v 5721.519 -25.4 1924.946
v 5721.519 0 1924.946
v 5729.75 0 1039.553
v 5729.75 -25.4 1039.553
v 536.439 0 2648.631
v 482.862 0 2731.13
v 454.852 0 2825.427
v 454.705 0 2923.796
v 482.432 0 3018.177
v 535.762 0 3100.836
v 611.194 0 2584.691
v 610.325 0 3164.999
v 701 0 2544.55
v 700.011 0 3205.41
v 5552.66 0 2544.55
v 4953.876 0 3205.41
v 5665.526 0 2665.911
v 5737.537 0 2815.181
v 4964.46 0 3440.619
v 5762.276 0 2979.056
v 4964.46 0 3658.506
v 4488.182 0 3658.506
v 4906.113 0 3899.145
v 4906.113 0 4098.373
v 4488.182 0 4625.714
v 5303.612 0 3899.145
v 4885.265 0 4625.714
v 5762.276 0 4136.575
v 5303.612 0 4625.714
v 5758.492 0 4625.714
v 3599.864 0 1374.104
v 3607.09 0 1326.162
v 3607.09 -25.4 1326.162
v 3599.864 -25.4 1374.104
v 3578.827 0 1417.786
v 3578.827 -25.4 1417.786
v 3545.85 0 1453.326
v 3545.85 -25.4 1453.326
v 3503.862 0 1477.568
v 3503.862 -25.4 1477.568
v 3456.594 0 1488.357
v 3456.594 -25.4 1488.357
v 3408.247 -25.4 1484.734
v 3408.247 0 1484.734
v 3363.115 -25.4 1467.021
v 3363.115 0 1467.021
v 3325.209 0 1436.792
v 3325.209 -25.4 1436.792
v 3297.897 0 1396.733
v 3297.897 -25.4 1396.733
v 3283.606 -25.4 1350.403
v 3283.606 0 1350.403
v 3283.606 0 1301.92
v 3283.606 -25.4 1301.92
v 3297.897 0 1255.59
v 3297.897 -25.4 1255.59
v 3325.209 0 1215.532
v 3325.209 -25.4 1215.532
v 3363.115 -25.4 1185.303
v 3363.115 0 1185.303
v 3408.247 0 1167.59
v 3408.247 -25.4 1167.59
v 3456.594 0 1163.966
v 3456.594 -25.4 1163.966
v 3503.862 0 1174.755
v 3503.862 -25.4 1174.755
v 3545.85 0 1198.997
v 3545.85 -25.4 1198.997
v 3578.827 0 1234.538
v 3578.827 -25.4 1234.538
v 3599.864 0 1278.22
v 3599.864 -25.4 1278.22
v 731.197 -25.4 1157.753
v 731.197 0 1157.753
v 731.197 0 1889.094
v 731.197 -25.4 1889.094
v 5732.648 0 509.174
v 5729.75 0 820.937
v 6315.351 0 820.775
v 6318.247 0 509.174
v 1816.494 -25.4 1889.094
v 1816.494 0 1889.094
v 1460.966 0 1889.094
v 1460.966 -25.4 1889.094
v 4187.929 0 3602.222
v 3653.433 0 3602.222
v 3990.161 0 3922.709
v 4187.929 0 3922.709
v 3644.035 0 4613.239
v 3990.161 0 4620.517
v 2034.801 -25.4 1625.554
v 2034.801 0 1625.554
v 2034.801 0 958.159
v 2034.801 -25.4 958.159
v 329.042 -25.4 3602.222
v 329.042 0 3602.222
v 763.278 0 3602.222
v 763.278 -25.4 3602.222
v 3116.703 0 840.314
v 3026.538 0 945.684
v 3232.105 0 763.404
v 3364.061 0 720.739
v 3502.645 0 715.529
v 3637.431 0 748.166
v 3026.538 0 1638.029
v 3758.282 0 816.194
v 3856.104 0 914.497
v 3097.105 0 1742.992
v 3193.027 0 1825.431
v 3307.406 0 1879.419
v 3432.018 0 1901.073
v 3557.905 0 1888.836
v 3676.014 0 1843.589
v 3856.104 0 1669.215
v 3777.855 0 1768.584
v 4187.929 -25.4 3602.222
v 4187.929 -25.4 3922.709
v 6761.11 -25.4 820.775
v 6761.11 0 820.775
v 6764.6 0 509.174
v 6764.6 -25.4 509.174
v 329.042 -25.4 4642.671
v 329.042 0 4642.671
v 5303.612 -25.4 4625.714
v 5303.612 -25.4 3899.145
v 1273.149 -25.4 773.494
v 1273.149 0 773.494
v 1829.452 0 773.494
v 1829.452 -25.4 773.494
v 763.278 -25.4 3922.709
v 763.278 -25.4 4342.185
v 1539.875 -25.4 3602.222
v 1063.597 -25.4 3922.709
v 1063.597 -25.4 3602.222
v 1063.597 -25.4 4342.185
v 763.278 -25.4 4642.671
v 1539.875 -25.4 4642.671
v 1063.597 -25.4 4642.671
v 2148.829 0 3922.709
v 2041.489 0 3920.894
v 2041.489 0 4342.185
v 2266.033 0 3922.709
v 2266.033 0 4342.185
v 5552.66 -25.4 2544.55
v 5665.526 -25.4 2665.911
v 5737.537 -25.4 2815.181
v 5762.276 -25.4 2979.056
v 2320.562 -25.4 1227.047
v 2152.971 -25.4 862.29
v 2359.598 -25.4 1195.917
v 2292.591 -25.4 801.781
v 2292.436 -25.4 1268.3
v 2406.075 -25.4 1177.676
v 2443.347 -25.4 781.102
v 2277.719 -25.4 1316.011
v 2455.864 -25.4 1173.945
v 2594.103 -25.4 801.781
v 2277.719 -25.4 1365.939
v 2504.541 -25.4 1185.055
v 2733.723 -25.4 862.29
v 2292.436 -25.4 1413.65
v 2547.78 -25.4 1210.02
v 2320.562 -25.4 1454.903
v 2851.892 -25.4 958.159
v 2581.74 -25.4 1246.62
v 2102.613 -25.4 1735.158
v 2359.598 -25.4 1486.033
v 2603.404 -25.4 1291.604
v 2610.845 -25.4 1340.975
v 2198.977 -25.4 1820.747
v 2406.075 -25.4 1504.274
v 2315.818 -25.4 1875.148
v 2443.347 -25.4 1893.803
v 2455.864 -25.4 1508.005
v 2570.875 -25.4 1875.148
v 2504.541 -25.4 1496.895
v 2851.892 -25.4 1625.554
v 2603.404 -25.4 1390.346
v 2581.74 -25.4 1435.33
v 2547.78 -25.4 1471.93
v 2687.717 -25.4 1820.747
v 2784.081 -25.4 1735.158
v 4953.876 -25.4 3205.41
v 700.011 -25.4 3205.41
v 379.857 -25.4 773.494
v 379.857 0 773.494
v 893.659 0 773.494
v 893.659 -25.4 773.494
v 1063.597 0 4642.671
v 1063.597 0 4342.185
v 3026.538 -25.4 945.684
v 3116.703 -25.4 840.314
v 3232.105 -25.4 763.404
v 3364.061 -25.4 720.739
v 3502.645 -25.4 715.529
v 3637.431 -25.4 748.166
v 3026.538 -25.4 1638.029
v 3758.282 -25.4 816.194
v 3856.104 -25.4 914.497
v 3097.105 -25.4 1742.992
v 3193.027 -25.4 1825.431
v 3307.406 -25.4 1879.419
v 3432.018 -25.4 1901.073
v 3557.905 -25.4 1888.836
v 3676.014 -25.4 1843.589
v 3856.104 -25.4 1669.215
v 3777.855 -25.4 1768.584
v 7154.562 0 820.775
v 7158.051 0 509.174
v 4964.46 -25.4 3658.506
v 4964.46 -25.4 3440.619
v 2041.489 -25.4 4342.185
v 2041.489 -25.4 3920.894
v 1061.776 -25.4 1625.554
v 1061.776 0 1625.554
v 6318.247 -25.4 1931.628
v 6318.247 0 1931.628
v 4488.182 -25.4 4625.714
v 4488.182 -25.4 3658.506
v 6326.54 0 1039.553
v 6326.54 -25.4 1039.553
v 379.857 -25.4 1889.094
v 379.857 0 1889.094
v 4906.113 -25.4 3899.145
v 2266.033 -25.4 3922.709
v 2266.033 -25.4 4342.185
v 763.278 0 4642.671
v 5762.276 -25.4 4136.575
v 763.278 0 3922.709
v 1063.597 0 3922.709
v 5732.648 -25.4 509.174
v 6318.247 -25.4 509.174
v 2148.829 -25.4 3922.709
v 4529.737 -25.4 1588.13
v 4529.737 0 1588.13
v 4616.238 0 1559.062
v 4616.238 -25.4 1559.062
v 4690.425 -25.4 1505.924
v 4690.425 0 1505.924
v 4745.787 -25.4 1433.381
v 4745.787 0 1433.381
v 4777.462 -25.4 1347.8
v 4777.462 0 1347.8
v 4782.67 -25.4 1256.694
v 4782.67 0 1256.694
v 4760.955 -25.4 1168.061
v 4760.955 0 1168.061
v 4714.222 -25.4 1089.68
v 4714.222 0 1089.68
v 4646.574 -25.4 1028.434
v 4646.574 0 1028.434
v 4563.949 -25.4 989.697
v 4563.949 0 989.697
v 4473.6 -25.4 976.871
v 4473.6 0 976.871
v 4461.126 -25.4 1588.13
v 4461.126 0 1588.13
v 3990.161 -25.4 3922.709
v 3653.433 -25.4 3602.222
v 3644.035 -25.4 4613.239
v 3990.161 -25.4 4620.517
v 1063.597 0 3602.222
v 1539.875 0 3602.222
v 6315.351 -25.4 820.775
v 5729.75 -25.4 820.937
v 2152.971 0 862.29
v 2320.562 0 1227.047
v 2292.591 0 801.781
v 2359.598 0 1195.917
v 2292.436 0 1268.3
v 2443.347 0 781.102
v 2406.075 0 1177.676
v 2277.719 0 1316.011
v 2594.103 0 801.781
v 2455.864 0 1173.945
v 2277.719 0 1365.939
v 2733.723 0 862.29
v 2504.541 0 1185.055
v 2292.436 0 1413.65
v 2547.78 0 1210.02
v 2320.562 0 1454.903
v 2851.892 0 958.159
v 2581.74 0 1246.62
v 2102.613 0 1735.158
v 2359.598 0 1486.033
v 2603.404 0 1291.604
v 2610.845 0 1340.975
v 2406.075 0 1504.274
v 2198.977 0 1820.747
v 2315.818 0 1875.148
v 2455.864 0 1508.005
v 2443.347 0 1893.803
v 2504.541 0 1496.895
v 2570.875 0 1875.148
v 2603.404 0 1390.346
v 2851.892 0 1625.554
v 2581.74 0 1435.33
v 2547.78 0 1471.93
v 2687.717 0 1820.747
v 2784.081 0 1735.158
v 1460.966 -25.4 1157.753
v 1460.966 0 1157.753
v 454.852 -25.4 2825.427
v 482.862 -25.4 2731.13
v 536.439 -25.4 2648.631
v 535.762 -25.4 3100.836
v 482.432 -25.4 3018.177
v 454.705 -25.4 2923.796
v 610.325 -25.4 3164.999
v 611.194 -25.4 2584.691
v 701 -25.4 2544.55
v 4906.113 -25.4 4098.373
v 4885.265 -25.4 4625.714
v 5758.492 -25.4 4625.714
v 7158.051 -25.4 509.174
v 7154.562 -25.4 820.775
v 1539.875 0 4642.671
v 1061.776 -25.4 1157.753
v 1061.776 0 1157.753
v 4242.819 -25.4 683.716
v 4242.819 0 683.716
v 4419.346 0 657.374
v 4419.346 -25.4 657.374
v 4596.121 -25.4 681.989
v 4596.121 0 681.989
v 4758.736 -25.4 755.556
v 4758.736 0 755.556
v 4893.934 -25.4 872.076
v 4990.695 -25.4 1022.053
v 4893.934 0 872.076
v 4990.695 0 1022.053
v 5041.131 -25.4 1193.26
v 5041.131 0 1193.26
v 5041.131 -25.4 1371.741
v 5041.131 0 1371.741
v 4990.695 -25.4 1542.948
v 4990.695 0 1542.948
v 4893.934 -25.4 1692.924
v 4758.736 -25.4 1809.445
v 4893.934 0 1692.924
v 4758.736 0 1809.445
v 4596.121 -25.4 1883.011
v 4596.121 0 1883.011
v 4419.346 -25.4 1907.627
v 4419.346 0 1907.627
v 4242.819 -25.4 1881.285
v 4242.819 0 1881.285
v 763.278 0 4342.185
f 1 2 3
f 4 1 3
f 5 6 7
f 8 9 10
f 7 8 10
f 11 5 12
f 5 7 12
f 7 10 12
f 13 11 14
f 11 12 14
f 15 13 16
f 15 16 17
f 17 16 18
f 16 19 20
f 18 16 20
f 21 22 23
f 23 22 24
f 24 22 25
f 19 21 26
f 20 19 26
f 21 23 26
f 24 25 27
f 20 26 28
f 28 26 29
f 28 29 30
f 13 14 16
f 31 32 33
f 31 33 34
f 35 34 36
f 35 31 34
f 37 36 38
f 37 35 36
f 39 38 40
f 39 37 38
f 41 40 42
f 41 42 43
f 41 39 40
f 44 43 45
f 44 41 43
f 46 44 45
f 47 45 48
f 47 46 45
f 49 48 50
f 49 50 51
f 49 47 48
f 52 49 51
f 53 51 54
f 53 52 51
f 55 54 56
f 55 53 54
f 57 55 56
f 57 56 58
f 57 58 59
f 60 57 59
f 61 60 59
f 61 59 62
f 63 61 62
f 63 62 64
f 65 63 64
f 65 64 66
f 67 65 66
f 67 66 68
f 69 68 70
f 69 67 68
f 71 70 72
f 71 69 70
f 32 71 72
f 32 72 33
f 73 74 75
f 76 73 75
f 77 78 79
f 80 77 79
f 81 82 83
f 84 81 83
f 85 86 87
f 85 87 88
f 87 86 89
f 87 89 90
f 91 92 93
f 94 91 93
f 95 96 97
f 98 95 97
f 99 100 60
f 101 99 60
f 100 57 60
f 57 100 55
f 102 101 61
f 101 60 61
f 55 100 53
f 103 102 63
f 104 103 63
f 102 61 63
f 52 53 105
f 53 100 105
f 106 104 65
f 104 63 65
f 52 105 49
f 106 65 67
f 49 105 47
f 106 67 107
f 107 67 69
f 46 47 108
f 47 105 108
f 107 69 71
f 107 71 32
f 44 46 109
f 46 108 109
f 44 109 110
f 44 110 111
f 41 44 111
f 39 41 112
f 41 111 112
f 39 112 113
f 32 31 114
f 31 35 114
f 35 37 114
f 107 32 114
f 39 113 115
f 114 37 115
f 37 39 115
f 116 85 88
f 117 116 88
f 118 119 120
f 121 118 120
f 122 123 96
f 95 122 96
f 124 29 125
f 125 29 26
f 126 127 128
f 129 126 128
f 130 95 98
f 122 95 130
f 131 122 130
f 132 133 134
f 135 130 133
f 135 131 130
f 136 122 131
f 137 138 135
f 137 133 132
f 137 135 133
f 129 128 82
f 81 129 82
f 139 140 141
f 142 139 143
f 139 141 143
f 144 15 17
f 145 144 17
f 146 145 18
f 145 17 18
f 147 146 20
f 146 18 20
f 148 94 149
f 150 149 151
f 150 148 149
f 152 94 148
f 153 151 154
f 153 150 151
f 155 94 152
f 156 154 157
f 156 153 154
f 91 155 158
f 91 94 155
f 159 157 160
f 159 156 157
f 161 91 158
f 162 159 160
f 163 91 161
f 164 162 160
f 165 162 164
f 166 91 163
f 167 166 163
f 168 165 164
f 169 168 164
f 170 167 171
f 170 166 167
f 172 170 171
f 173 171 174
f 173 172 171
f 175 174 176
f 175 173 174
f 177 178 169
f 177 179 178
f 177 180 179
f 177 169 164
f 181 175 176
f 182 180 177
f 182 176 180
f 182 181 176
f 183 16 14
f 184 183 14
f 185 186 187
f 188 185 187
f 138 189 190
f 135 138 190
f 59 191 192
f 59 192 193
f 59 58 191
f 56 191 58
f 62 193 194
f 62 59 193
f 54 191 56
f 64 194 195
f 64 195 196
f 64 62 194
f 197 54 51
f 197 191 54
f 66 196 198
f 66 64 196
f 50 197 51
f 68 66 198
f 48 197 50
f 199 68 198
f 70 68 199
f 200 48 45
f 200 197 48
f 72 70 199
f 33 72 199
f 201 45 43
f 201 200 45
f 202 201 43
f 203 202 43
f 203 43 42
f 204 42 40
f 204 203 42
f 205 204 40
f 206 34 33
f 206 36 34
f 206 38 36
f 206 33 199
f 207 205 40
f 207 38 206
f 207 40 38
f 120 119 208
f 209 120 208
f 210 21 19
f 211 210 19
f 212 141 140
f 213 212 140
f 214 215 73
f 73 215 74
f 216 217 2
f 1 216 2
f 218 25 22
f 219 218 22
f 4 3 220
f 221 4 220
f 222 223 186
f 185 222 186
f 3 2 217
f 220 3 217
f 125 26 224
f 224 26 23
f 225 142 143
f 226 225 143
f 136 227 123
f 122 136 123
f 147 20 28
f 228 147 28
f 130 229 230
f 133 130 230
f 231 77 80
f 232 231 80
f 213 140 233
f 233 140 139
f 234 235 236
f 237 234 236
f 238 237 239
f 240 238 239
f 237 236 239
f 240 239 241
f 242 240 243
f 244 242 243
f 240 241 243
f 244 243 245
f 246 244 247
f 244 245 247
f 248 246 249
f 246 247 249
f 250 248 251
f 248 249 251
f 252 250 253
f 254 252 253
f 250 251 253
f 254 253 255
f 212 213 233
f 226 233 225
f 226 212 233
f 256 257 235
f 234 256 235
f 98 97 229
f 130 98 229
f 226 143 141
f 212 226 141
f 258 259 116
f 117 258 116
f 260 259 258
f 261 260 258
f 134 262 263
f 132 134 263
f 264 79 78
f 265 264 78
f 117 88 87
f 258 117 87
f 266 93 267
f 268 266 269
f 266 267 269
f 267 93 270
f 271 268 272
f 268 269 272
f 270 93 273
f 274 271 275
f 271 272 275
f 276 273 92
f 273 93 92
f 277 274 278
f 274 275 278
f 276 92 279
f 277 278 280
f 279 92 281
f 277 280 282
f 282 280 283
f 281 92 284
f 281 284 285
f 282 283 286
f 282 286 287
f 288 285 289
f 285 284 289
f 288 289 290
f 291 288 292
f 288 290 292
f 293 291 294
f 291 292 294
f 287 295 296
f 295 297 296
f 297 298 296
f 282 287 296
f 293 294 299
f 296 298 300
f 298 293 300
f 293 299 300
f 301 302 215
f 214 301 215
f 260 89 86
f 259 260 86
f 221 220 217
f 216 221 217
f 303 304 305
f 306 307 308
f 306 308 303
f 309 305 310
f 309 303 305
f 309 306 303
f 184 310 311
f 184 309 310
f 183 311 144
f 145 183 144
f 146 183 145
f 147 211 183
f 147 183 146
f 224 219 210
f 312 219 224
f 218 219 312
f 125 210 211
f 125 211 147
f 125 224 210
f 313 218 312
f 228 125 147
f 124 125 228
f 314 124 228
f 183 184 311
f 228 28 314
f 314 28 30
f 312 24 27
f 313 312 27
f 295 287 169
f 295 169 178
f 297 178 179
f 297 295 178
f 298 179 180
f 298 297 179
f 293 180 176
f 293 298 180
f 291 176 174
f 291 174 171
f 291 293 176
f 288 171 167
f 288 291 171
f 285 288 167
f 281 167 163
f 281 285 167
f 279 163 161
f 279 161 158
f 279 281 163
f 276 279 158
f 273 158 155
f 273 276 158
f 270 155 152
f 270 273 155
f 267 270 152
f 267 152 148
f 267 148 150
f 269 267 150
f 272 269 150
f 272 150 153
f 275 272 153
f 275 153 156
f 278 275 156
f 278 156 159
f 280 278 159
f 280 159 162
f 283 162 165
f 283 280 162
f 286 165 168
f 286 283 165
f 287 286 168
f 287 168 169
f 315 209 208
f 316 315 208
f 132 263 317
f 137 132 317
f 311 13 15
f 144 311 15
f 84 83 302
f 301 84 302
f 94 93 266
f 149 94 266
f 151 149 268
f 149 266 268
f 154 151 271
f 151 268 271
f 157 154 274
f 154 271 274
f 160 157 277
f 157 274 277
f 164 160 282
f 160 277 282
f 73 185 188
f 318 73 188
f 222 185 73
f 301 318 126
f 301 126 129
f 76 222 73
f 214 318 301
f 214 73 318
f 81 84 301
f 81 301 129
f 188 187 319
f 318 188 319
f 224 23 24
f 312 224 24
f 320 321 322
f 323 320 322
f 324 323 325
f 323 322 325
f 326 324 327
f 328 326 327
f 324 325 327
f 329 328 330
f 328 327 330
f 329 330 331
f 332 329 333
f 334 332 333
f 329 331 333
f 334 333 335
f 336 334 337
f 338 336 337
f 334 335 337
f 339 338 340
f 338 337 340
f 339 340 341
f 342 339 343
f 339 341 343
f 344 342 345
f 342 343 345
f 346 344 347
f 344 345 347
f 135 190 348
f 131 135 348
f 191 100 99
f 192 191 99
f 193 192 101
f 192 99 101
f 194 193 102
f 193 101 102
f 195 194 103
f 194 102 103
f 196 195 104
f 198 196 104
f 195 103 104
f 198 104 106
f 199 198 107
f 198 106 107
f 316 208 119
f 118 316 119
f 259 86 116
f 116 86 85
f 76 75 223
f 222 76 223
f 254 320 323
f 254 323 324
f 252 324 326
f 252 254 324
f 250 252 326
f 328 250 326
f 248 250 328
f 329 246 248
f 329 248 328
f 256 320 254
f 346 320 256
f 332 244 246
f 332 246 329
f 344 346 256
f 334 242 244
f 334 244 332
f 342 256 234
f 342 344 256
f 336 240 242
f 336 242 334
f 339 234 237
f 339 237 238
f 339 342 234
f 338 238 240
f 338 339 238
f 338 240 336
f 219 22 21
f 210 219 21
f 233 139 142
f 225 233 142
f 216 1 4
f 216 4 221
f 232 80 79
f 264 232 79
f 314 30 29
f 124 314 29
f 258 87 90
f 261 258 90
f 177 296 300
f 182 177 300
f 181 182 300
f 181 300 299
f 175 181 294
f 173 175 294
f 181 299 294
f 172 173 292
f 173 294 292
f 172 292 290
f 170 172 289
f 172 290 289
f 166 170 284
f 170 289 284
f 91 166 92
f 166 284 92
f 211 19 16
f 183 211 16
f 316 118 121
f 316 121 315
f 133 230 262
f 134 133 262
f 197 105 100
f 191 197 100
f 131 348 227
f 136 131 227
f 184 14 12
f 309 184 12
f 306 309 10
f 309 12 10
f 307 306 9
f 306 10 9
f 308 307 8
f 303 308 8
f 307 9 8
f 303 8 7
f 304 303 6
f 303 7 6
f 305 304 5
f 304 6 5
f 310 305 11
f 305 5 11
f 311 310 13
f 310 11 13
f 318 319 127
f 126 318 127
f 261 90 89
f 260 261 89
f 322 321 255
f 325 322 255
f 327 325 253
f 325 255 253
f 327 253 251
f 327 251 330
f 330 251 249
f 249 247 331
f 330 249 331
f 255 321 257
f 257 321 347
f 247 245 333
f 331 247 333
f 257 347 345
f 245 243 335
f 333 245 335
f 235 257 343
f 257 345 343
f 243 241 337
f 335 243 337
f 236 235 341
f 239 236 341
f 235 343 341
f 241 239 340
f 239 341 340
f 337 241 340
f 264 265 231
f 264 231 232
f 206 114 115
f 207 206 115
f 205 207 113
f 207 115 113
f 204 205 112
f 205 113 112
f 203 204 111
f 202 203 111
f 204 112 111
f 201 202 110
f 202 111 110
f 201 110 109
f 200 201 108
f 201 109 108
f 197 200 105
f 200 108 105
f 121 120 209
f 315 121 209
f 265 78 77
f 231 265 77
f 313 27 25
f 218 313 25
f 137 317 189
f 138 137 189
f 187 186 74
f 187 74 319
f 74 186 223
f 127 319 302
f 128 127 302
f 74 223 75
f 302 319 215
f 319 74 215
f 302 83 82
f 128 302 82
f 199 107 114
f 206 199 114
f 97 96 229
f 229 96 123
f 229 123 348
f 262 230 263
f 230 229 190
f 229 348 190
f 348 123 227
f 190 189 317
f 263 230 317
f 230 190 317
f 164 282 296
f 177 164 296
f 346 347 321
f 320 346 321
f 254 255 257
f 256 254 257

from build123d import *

# Parameters (mm, degrees)
F0_R     = 167.498177
F0_R_2   = 162.649982
F3_DEPTH = 25.4


with BuildPart() as f3:
    # F0 (on Front) → F3 (new body)
    with BuildSketch(Plane.XZ):
        Polygon((329.041988, 4642.670631), (329.041988, 4613.238811), (329.041988, 3602.222204), (763.278008, 3602.222204), (763.278008, 3922.709465), (1063.596725, 3922.709465), (1063.596725, 3602.222204), (1539.875388, 3602.222204), (1539.875388, 4642.670631), (1063.596725, 4642.670631), (1063.596725, 4342.184544), (763.278008, 4342.184544), (763.278008, 4642.670631), align=None)
        Polygon((3644.034624, 4613.238811), (3653.433323, 3602.222204), (4187.928677, 3602.222204), (4187.928677, 3922.709465), (3990.161419, 3922.709465), (3990.161419, 4620.517015), align=None)
        with BuildLine():
            Line((4488.181591, 4625.713825), (4488.181591, 4136.575222))
            Line((4488.181591, 4136.575222), (4488.181591, 3658.505917))
            Line((4488.181591, 3658.505917), (4964.460373, 3658.505917))
            Line((4964.460373, 3658.505917), (4964.460373, 3440.619469))
            Line((4964.460373, 3440.619469), (4953.875542, 3205.409527))
            Line((4953.875542, 3205.409527), (4485.037804, 3205.409527))
            Line((4485.037804, 3205.409527), (700.010717, 3205.409527))
            ThreePointArc((700.010717, 3205.409527), (451.240556, 2874.606327), (701.000392, 2544.549704))
            Line((701.000392, 2544.549704), (4940.819263, 2544.549704))
            Line((4940.819263, 2544.549704), (5552.659988, 2544.549704))
            ThreePointArc((5552.659988, 2544.549704), (5707.133118, 2737.843393), (5762.275696, 2979.056358))
            Line((5762.275696, 2979.056358), (5762.275696, 3364.673376))
            Line((5762.275696, 3364.673376), (5762.275696, 4136.575222))
            Line((5762.275696, 4136.575222), (5758.49247, 4625.713825))
            Line((5758.49247, 4625.713825), (5303.611755, 4625.713825))
            Line((5303.611755, 4625.713825), (5303.611755, 4136.575222))
            Line((5303.611755, 4136.575222), (5303.611755, 3899.145365))
            Line((5303.611755, 3899.145365), (4906.112671, 3899.145365))
            Line((4906.112671, 3899.145365), (4906.112671, 4098.373413))
            Line((4906.112671, 4098.373413), (4885.264874, 4625.713825))
            Line((4885.264874, 4625.713825), (4488.181591, 4625.713825))
        make_face()
        Polygon((731.197298, 1889.094234), (379.856974, 1889.094234), (379.856974, 773.494184), (893.658519, 773.494184), (1061.7764, 1157.753468), (1273.14949, 773.494184), (1829.451919, 773.494184), (1816.494226, 1889.094234), (1460.965991, 1889.094234), (1460.965991, 1157.753468), (1061.7764, 1625.553846), (731.197298, 1157.753468), align=None)
        with BuildLine():
            ThreePointArc((2851.892471, 1625.553846), (2443.346858, 1893.803047), (2034.801245, 1625.553846))
            Line((2034.801245, 1625.553846), (2034.801245, 958.158672))
            ThreePointArc((2034.801245, 958.158672), (2443.346858, 781.101922), (2851.892471, 958.158672))
            Line((2851.892471, 958.158672), (2851.892471, 1625.553846))
        make_face()
        with Locations((2443.346858, 1340.974988)):
            Circle(F0_R, mode=Mode.SUBTRACT)
        with BuildLine():
            ThreePointArc((3856.103897, 1669.215202), (3432.018231, 1901.072685), (3026.537895, 1638.028502))
            Line((3026.537895, 1638.028502), (3026.537895, 945.684016))
            ThreePointArc((3026.537895, 945.684016), (3433.173124, 713.359976), (3856.103897, 914.497316))
            Line((3856.103897, 914.497316), (3856.103897, 1669.215202))
        make_face()
        with Locations((3444.43965, 1326.161623)):
            Circle(F0_R_2, mode=Mode.SUBTRACT)
        with BuildLine():
            ThreePointArc((4242.818832, 683.715761), (5047.53394, 1282.500237), (4242.818832, 1881.284714))
            Line((4242.818832, 1881.284714), (4242.818832, 683.715761))
        make_face()
        with BuildLine():
            Line((4473.600388, 976.870716), (4461.125851, 1588.129878))
            Line((4461.125851, 1588.129878), (4529.736519, 1588.129878))
            ThreePointArc((4529.736519, 1588.129878), (4782.670202, 1256.693974), (4473.600388, 976.870716))
        make_face(mode=Mode.SUBTRACT)
        Polygon((2266.033411, 4342.184544), (2148.829103, 4342.184544), (2041.489124, 4342.184544), (2041.489124, 3920.894384), (2148.829103, 3922.709465), (2266.033411, 3922.709465), align=None)
        Polygon((6318.24748, 1931.628216), (5721.518993, 1924.946189), (5729.749866, 1039.55251), (6326.54047, 1039.55251), align=None)
        Polygon((6315.350744, 820.775208), (5729.749866, 820.937216), (5732.648108, 509.173737), (6318.24748, 509.173737), align=None)
        Polygon((7154.56225, 820.775208), (6761.110306, 820.775208), (6764.599547, 509.173737), (7158.051491, 509.173737), align=None)
    extrude(amount=F3_DEPTH)


solid = f3.part
